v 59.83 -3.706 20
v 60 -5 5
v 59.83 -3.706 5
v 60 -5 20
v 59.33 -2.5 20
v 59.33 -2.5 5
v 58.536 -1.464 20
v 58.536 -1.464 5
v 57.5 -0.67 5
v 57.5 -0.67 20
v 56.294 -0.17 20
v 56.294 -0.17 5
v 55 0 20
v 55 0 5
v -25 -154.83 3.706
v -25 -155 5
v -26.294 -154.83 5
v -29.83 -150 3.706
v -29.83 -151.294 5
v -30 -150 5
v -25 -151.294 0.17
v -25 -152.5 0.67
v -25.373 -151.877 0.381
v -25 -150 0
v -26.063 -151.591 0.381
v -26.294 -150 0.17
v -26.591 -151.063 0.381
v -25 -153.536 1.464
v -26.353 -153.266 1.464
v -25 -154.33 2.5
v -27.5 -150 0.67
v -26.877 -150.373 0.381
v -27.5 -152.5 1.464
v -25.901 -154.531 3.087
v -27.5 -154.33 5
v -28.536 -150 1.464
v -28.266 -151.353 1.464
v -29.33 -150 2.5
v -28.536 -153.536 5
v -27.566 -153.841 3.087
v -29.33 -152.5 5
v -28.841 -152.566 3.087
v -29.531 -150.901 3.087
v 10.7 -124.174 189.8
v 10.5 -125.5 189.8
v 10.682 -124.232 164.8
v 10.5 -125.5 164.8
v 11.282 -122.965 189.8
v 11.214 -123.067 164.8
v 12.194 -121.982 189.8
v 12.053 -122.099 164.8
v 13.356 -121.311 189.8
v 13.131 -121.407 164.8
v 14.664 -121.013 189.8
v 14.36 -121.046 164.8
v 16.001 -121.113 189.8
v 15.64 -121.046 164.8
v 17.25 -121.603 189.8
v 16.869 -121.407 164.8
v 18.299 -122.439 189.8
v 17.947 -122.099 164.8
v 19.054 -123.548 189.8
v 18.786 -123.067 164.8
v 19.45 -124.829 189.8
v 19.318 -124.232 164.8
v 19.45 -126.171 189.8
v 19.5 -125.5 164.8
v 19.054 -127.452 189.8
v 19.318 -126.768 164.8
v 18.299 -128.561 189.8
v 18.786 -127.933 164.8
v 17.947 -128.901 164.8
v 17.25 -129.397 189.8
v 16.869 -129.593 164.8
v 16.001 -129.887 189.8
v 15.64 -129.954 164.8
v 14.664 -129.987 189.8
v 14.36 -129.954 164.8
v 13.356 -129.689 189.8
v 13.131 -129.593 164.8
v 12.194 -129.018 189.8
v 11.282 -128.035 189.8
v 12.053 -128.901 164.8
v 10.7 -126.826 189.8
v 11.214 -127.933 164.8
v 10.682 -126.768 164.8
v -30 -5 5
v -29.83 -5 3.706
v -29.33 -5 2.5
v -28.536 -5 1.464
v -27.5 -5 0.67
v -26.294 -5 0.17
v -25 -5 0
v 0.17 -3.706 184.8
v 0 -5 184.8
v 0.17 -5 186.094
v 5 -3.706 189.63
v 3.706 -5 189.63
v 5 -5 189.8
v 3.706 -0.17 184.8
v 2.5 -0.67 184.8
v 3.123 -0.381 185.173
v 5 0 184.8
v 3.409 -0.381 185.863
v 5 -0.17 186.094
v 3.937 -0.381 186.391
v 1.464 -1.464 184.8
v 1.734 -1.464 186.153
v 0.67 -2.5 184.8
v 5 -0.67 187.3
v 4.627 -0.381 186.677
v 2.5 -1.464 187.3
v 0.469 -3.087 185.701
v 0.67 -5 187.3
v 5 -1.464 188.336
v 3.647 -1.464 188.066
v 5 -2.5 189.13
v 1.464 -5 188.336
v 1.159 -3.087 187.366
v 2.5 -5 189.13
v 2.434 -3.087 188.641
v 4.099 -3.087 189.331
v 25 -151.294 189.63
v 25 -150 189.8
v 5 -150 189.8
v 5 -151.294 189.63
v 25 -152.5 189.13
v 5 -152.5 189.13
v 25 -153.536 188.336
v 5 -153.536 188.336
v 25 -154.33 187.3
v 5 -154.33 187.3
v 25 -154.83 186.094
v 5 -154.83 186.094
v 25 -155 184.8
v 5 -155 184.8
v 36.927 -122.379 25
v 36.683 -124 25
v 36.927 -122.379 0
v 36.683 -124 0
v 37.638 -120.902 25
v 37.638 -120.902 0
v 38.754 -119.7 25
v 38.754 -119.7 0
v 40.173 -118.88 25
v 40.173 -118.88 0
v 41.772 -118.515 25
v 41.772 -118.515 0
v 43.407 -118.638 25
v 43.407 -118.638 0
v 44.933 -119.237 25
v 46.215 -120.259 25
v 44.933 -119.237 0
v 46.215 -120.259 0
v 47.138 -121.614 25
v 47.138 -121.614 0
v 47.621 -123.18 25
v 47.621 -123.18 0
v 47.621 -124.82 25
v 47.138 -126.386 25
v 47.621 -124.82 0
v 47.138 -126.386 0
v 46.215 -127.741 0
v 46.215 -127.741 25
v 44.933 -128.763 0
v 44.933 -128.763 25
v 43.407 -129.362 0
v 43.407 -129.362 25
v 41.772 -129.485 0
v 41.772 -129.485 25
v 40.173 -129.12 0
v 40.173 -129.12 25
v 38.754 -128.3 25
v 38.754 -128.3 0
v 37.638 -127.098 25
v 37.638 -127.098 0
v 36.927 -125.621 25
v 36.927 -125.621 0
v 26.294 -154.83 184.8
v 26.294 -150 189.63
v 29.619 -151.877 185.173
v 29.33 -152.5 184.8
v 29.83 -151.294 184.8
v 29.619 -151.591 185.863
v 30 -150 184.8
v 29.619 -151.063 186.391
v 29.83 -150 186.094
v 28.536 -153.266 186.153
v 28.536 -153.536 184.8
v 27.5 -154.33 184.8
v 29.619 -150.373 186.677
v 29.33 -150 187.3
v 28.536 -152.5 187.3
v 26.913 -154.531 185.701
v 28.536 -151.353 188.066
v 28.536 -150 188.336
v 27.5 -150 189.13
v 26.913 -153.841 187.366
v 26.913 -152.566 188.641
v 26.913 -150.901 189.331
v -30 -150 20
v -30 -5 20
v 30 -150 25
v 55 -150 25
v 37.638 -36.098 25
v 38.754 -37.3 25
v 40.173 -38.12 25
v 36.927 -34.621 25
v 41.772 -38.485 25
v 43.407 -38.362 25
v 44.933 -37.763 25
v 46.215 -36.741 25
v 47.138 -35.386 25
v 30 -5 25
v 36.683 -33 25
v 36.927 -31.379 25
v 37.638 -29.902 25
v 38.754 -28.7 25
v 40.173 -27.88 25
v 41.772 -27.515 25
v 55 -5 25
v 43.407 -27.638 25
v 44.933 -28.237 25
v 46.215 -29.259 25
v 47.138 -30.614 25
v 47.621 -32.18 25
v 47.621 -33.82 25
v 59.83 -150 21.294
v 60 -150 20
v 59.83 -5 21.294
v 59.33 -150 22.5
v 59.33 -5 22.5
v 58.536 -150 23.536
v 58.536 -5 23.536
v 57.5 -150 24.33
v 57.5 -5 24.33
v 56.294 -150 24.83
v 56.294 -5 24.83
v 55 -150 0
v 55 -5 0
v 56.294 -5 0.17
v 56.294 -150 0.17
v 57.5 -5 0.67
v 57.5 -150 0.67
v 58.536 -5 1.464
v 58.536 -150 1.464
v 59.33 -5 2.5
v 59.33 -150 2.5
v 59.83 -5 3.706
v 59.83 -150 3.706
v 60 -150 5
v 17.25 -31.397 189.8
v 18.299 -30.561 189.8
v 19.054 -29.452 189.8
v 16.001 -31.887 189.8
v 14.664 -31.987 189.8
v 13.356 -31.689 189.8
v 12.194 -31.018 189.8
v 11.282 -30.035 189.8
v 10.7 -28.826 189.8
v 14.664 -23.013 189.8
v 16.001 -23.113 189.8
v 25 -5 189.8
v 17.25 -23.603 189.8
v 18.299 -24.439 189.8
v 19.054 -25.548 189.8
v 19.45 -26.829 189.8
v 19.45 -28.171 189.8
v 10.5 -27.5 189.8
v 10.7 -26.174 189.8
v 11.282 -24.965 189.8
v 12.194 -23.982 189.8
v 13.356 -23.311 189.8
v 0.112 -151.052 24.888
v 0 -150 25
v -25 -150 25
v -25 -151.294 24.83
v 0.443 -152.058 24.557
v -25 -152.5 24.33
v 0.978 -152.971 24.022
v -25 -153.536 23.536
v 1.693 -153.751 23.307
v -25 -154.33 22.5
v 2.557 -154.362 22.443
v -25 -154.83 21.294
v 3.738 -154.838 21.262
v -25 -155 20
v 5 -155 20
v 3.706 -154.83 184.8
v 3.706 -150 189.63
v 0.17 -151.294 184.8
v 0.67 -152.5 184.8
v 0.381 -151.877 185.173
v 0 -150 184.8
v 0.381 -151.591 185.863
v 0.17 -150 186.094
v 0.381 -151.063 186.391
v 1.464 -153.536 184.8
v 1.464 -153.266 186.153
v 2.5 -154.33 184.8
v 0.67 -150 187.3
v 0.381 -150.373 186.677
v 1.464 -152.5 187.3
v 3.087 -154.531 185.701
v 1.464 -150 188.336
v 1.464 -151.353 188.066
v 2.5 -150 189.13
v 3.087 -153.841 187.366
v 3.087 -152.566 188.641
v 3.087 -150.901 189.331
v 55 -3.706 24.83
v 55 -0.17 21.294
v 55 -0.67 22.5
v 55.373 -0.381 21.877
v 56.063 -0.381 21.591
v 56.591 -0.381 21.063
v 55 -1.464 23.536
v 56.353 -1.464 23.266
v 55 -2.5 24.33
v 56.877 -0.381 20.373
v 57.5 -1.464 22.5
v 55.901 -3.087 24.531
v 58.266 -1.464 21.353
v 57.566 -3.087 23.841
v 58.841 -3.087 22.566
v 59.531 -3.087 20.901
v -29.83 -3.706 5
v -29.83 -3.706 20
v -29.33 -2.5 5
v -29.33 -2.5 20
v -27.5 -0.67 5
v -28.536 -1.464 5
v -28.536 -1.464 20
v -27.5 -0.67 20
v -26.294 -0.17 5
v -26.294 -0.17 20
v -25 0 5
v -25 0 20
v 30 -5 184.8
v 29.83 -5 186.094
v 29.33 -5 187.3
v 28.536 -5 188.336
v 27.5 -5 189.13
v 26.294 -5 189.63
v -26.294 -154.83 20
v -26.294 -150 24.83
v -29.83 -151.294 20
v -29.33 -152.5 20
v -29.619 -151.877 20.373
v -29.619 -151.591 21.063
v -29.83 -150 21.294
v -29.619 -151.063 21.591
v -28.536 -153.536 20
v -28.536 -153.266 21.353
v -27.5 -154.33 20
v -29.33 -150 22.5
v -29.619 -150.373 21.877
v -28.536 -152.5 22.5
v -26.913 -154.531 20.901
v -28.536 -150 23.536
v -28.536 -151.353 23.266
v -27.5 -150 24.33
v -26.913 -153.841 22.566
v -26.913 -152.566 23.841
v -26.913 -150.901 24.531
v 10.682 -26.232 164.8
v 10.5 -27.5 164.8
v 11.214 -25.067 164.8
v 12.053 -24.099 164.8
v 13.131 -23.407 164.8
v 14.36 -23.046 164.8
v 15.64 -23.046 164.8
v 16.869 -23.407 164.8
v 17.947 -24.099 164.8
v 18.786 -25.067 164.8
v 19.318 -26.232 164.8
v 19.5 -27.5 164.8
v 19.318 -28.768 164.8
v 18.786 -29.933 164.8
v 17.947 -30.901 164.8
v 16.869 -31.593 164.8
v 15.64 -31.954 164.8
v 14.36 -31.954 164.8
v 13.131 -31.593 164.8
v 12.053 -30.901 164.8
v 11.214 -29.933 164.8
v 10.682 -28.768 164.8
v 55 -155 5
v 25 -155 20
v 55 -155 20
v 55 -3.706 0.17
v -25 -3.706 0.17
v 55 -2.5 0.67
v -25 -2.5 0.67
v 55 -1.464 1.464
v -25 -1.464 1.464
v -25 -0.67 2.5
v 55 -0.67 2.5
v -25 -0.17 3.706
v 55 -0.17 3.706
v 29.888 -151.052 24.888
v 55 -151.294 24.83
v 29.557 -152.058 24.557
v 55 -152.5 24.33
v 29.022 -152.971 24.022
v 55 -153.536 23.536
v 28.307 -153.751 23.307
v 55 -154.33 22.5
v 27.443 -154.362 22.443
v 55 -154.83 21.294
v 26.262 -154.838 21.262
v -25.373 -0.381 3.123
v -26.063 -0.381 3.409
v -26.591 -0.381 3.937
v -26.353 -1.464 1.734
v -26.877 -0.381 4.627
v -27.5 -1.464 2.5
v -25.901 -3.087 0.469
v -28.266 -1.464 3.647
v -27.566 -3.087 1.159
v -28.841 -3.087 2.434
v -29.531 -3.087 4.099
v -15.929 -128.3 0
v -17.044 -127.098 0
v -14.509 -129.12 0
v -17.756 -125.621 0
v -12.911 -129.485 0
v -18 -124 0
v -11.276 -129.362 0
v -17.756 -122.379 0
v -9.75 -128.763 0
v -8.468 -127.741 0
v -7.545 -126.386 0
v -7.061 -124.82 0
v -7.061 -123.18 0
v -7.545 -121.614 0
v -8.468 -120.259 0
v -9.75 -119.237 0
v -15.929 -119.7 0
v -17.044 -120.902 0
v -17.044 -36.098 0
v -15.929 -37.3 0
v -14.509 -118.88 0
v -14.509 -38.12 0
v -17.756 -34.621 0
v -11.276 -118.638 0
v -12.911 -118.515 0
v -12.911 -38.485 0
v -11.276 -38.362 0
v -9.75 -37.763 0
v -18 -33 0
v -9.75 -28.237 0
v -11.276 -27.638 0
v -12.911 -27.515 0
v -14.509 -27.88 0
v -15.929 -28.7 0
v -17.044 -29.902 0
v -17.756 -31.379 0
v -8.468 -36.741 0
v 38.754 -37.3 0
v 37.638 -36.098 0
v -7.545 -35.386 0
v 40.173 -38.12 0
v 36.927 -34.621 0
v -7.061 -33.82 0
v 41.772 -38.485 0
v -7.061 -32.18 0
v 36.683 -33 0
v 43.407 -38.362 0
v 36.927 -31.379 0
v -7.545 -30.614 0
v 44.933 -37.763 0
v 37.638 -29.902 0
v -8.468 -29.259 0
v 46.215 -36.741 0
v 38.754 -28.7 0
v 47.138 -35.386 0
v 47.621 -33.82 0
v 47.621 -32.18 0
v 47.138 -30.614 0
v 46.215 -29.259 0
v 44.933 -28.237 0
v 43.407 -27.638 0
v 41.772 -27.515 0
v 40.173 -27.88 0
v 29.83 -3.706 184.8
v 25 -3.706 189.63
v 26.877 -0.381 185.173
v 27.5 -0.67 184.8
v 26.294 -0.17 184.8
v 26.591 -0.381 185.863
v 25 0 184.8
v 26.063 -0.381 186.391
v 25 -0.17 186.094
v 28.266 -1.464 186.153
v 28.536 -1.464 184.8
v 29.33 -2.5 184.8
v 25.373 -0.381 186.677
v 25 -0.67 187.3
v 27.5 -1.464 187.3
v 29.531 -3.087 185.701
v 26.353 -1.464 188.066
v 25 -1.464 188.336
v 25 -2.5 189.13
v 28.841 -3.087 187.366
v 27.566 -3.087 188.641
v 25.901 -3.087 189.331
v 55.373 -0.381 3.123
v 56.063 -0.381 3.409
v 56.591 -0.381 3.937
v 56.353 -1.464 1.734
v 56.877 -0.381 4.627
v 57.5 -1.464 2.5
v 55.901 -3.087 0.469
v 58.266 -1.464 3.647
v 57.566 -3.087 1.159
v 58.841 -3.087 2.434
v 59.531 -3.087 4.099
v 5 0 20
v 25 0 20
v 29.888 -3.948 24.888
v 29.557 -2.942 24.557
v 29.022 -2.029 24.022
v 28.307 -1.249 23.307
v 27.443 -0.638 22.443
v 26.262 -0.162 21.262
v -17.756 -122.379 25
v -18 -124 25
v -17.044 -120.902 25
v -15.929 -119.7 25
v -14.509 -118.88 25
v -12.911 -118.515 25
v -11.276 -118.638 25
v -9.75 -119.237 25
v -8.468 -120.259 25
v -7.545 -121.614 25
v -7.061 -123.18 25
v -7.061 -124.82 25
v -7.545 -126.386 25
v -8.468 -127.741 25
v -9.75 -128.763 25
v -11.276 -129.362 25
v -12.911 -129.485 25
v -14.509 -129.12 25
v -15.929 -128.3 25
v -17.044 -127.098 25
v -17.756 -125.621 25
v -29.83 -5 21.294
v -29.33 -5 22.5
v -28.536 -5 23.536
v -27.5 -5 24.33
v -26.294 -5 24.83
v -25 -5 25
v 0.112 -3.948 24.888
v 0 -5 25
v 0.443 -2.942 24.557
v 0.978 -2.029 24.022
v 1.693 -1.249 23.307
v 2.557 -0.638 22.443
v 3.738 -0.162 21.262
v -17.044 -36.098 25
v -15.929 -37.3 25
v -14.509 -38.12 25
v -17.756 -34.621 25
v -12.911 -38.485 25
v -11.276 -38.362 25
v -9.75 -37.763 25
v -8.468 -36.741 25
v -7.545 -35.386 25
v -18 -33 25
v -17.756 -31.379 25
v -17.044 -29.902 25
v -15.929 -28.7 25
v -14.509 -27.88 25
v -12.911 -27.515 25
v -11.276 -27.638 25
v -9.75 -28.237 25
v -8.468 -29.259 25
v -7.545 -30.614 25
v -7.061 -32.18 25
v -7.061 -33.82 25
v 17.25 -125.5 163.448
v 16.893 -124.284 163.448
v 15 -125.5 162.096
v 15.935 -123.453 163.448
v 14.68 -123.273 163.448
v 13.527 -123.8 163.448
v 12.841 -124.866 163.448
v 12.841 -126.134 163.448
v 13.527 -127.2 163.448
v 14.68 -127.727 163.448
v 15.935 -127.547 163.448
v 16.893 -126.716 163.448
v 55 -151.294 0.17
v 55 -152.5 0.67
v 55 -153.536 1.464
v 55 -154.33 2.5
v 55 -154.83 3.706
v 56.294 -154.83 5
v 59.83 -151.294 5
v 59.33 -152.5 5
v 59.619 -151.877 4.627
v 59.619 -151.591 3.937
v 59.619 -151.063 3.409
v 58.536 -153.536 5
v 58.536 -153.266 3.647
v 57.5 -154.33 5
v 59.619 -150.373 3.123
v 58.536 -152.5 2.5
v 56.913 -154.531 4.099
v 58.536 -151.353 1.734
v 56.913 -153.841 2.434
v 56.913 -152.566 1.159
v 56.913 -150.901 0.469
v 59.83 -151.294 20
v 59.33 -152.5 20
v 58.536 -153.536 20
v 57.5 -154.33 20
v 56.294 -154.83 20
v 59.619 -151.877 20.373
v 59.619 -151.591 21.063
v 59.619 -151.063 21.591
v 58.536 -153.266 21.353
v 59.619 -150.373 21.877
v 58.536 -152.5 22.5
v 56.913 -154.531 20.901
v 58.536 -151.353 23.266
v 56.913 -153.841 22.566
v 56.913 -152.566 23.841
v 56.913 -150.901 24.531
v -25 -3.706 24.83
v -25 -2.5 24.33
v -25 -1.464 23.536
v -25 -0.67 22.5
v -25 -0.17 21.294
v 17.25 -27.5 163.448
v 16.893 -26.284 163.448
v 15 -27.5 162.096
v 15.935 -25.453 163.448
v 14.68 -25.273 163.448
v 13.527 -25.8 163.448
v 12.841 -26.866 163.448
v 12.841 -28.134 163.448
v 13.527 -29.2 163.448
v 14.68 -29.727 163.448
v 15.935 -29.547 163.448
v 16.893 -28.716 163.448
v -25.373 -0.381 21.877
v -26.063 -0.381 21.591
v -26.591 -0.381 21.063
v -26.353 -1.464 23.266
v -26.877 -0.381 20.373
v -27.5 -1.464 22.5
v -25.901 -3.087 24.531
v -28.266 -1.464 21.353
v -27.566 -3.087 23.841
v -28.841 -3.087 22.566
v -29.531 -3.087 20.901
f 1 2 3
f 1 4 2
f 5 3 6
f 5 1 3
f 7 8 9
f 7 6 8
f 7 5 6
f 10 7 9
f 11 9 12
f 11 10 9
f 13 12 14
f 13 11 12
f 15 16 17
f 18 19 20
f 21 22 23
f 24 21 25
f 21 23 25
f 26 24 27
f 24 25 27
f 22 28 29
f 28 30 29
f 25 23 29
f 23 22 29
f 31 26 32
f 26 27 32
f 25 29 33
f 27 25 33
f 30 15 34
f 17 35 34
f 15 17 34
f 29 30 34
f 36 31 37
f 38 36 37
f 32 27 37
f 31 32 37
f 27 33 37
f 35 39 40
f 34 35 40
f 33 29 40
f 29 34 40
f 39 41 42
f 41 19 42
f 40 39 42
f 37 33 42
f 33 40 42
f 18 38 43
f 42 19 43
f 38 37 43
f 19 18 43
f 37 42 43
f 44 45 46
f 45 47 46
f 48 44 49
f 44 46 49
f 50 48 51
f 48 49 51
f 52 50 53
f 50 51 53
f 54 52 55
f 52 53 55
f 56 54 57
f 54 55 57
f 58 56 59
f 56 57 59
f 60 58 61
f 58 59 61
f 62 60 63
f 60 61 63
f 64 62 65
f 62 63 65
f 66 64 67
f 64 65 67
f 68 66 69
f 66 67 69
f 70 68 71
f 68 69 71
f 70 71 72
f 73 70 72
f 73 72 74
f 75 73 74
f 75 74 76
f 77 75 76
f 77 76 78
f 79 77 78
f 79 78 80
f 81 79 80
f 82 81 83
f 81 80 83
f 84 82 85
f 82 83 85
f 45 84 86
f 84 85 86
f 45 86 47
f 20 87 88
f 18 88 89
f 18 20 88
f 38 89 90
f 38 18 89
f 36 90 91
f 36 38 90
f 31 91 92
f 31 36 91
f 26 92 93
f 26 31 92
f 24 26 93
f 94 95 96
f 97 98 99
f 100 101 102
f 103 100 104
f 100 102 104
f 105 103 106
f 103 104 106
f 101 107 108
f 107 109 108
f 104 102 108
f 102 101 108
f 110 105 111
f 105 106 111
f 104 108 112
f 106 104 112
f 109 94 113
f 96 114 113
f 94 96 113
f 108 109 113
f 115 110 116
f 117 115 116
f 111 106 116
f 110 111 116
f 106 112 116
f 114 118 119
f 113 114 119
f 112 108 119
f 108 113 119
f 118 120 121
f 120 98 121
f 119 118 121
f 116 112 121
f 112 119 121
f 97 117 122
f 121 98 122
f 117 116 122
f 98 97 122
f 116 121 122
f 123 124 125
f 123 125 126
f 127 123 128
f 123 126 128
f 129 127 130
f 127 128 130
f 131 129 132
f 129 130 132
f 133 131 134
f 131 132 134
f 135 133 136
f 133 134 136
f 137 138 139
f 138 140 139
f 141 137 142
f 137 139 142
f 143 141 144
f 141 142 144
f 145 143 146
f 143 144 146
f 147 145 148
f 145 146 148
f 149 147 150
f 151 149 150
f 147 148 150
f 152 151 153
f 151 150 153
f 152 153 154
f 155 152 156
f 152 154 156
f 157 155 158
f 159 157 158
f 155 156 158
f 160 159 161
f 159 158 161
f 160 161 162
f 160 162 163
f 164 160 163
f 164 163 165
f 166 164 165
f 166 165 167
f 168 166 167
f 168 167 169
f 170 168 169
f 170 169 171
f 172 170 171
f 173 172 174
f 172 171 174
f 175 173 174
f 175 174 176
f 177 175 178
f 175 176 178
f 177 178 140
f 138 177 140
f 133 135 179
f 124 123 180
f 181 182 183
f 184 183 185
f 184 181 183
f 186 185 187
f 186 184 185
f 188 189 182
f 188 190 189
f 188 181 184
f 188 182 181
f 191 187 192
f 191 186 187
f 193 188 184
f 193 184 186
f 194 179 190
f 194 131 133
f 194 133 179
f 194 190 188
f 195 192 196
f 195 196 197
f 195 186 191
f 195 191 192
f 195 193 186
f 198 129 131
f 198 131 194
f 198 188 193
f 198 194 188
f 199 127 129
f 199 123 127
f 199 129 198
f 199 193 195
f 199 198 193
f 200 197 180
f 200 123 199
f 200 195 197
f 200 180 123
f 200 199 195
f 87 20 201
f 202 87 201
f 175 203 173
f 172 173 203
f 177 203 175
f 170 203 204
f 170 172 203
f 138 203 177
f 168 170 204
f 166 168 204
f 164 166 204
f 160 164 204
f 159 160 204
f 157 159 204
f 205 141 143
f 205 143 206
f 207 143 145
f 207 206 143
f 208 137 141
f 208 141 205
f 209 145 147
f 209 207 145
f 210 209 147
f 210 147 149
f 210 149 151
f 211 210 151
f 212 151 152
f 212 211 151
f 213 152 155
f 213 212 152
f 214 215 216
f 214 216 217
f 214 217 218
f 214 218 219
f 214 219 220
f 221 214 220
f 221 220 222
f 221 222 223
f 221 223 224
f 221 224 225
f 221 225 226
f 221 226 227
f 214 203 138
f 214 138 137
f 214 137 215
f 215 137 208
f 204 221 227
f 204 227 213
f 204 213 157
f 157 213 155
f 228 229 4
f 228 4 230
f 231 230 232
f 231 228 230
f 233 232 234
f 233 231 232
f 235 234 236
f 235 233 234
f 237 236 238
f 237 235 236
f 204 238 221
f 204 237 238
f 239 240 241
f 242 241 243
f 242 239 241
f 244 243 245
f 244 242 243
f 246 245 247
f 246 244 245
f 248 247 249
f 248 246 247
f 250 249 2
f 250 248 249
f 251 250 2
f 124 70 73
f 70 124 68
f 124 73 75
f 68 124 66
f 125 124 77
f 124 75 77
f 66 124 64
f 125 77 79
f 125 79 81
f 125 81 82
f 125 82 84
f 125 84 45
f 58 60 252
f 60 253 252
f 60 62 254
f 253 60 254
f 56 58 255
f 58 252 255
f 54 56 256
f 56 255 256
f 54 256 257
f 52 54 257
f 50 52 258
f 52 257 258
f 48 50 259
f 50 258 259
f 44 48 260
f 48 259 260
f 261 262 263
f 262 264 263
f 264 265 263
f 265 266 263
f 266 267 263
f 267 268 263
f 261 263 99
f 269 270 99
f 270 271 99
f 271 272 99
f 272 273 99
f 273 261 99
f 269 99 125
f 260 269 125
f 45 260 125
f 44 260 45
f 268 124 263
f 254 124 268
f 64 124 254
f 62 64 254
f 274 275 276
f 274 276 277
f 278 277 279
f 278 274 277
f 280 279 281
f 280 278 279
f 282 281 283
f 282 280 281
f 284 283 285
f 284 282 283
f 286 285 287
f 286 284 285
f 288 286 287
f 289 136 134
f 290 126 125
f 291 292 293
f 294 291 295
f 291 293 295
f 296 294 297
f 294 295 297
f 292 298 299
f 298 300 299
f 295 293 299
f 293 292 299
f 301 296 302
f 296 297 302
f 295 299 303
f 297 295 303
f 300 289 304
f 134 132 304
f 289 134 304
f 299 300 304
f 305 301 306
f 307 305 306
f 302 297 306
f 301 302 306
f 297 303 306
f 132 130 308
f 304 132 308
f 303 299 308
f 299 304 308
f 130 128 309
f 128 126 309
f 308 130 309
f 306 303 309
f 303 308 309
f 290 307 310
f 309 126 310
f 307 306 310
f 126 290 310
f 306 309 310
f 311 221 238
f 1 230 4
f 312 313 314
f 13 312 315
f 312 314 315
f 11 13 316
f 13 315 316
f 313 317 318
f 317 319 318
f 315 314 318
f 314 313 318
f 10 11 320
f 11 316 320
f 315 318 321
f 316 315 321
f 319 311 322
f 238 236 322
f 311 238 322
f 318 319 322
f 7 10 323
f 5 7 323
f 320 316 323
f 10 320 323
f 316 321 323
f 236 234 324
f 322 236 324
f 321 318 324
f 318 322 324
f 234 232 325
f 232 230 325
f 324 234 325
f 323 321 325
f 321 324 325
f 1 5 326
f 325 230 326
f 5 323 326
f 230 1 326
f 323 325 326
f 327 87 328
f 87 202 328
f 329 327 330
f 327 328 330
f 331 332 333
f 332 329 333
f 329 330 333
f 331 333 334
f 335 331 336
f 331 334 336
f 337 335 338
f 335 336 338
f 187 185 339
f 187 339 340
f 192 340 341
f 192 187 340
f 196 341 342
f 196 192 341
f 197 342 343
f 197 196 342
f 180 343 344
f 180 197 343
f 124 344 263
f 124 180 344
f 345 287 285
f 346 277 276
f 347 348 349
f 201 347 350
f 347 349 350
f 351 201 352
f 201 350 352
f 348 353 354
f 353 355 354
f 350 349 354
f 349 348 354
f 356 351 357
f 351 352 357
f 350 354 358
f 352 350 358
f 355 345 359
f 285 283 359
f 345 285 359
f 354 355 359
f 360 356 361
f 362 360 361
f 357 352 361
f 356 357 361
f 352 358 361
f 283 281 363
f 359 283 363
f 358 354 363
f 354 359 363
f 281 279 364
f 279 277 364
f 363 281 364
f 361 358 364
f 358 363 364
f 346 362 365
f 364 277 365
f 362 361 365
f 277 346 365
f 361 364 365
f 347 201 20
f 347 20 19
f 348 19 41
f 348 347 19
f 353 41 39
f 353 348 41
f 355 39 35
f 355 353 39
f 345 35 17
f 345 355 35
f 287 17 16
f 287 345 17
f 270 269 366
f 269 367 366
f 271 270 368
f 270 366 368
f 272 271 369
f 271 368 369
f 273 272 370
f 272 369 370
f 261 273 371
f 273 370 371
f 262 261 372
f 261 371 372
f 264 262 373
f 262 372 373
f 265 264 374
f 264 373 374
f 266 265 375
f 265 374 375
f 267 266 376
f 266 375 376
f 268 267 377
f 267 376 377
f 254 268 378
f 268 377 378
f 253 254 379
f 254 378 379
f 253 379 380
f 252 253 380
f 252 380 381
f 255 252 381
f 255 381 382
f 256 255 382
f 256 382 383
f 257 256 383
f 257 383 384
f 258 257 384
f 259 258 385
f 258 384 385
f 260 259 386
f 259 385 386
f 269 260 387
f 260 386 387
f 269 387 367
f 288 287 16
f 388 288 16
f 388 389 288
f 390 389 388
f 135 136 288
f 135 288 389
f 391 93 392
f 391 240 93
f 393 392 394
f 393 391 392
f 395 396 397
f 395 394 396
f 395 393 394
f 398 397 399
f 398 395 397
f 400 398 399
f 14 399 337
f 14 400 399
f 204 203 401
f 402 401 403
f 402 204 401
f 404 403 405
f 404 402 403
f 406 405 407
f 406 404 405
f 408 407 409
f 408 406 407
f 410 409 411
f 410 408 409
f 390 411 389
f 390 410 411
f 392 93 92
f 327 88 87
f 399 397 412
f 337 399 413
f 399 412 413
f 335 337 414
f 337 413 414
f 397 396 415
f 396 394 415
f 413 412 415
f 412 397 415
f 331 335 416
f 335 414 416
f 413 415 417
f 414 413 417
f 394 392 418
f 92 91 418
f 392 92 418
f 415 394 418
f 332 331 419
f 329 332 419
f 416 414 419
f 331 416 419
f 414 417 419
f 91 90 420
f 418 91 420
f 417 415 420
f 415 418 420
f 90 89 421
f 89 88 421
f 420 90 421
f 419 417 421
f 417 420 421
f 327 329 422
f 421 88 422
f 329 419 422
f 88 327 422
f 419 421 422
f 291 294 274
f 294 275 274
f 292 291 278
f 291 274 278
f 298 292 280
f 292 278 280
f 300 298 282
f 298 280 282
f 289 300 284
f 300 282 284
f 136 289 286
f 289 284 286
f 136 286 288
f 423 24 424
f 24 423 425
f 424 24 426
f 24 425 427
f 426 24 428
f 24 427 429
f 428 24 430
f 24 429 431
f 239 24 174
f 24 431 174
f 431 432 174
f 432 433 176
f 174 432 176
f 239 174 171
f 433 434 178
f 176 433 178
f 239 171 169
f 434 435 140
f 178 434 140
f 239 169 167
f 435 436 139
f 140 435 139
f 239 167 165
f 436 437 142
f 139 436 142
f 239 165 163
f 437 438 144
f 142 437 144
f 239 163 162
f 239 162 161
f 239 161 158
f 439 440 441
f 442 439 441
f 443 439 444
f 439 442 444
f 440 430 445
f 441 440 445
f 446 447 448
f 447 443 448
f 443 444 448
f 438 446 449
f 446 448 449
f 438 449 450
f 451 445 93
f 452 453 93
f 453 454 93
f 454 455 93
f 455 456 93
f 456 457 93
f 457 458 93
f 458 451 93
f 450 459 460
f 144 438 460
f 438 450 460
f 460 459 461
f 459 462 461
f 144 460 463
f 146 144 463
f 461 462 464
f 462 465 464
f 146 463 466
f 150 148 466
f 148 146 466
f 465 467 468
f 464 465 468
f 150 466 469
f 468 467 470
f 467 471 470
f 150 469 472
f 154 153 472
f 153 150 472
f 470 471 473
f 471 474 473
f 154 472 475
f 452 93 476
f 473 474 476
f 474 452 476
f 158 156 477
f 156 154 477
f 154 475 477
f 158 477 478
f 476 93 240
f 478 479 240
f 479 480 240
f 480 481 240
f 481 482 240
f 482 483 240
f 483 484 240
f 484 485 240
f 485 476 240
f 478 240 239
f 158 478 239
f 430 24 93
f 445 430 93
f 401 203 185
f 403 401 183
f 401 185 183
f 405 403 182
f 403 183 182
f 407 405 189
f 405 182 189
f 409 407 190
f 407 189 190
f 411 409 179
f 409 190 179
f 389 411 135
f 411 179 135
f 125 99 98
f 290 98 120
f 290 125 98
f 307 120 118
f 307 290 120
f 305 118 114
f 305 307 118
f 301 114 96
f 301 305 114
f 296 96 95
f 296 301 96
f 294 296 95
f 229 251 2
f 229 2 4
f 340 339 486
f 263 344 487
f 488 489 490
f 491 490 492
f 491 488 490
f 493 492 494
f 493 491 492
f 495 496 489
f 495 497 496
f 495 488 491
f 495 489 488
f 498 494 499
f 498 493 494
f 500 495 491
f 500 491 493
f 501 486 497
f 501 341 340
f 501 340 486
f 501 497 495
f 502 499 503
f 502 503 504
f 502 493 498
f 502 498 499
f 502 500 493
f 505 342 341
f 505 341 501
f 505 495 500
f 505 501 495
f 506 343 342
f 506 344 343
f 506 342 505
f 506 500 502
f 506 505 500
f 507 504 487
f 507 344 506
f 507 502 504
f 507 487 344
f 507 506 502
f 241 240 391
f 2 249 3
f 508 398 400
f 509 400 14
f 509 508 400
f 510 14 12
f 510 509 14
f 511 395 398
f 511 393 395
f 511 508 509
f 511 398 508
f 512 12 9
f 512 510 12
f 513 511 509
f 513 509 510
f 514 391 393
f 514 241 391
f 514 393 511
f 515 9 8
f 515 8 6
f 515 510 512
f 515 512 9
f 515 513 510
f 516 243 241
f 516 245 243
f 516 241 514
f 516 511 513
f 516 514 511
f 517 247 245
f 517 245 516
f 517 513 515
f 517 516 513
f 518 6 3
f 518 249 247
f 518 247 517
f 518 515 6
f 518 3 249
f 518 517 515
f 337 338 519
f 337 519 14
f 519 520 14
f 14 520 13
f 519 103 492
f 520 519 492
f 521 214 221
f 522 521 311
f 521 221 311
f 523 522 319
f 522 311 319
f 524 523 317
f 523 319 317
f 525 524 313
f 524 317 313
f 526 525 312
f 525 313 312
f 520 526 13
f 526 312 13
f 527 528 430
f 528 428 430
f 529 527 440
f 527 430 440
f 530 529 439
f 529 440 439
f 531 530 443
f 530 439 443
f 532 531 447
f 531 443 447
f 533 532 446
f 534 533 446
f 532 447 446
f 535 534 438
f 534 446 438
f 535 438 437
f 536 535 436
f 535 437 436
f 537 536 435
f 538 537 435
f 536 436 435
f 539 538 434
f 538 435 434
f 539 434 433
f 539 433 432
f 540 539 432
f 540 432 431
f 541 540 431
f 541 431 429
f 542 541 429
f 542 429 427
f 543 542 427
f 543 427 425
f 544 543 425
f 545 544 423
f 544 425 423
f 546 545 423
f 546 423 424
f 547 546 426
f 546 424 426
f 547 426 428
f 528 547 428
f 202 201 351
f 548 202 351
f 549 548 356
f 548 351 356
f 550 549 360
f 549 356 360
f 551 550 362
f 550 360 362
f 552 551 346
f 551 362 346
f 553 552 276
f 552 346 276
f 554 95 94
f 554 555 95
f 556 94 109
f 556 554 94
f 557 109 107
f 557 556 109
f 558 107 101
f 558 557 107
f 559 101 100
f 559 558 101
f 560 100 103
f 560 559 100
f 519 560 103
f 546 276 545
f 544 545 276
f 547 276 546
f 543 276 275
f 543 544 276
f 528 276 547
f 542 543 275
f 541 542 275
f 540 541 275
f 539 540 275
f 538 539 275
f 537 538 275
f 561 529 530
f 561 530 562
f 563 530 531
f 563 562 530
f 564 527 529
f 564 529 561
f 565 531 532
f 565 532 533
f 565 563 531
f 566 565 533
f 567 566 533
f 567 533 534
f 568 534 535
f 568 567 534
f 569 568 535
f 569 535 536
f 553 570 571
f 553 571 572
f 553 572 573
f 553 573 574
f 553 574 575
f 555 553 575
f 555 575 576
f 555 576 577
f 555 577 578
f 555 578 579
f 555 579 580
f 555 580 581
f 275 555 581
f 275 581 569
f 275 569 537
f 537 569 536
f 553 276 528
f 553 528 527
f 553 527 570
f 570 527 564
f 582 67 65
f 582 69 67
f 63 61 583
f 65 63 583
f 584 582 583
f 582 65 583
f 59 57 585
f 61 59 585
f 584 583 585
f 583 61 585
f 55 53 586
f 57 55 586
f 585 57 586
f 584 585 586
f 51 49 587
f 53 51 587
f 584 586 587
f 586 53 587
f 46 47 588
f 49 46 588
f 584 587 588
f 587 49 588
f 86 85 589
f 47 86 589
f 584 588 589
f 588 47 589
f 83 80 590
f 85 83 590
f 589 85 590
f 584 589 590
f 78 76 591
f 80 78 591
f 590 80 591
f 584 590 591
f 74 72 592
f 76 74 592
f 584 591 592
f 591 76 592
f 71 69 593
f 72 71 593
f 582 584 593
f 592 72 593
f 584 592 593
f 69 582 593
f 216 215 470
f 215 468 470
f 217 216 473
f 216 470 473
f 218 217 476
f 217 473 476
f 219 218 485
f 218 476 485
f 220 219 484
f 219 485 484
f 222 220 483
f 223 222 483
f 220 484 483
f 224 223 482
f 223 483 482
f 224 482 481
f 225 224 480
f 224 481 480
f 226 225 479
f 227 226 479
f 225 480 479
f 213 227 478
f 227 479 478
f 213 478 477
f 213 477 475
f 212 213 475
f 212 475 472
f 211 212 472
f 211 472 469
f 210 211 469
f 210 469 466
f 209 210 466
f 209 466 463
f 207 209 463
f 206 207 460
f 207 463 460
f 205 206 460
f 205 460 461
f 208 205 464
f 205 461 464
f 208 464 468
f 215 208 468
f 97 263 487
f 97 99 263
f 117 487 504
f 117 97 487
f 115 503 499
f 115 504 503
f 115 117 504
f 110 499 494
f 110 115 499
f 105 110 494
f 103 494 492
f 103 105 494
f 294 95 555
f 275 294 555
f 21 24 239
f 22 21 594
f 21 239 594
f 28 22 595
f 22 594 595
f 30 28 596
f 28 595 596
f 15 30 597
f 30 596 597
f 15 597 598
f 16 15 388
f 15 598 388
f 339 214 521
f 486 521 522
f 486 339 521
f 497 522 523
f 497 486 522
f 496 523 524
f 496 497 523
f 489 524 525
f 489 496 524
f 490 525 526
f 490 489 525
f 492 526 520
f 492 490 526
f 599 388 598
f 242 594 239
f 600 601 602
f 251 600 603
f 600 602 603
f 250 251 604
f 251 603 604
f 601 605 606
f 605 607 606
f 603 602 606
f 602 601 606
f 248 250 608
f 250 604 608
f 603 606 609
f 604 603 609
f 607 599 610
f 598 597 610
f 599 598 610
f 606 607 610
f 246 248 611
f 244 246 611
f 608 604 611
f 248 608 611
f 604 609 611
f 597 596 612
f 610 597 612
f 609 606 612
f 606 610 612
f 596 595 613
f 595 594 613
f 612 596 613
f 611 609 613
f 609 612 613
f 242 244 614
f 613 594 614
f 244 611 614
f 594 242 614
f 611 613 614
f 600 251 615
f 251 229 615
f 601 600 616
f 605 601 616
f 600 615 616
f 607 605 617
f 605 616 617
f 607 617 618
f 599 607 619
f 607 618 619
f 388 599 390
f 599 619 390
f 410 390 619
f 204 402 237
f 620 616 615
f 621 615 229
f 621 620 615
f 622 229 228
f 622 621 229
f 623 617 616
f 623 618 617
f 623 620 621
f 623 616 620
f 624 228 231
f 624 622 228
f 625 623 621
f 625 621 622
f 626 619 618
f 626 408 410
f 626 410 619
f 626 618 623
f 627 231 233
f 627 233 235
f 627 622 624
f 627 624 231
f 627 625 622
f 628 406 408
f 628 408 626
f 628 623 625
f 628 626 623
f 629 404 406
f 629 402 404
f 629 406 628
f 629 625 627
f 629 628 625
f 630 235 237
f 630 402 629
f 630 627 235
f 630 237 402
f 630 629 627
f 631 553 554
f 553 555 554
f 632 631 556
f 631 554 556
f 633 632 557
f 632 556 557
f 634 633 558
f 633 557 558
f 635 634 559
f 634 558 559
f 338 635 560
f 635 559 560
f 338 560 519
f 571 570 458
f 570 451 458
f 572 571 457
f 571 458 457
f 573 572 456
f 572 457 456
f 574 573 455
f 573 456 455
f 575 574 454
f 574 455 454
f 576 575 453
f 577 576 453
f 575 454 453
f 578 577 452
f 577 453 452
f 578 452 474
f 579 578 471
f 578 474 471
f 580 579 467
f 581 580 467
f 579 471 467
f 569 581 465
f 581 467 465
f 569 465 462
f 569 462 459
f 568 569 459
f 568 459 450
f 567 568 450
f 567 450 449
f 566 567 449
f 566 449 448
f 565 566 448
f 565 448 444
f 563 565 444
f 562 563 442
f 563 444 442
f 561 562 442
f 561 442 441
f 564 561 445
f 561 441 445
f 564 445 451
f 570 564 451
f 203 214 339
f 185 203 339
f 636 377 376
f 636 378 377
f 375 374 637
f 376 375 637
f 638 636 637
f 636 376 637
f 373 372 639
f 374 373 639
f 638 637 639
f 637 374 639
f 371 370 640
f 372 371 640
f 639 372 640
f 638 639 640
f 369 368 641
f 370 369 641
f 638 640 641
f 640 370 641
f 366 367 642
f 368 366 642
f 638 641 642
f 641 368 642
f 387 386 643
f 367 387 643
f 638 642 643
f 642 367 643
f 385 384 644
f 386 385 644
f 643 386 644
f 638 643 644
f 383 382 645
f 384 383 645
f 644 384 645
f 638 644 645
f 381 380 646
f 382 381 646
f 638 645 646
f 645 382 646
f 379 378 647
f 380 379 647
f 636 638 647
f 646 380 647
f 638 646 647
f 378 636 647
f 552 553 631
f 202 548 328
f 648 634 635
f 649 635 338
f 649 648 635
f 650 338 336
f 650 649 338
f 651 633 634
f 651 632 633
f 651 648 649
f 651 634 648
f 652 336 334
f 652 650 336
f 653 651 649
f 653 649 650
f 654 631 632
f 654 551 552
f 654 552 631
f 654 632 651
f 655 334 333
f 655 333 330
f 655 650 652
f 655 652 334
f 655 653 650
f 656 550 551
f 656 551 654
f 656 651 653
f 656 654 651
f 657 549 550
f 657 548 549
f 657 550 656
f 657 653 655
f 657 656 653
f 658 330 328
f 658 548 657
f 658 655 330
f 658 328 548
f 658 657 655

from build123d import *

# Parameters (mm, degrees)
F0_W     = 30
F0_H     = 25
F1_DEPTH = 155
F2_R     = 5
F4_D     = 9
F4_DEPTH = 25
F4_TIP   = 2.7038727856
F6_D     = 11
F6_DEPTH = 25
F6_TIP   = 3.3047334047


with BuildPart() as f1:
    # F0 (on Front) → F1 (new body)
    with BuildSketch(Plane.XZ):
        with Locations((-15, 12.5)):
            Rectangle(F0_W, F0_H)
        Polygon((0, 25), (0, 0), (30, 0), (30, 25), (30, 189.8), (0, 189.8), align=None)
        with Locations((45, 12.5)):
            Rectangle(F0_W, F0_H)
    extrude(amount=F1_DEPTH)

    # F2
    f2_edges = [f1.edges().sort_by_distance(p)[0] for p in [
        (15, -155, 189.8),
        (0, -155, 107.4),
        (30, -155, 107.4),
        (45, -155, 25),
        (-15, -155, 25),
        (-30, -155, 12.5),
        (15, -155, 0),
        (60, -155, 12.5),
        (60, -77.5, 25),
        (60, -77.5, 0),
        (-30, -77.5, 25),
        (-30, -77.5, 0),
        (0, -77.5, 189.8),
        (30, -77.5, 189.8),
        (0, 0, 107.4),
        (30, 0, 107.4),
        (45, 0, 25),
        (15, 0, 0),
        (-15, 0, 25),
        (-30, 0, 12.5),
        (60, 0, 12.5),
        (15, 0, 189.8),
    ]]
    fillet(f2_edges, radius=F2_R)

    # F4
    with Locations(Plane.XY.offset(189.8)):
        with Locations((15, -27.5), (15, -125.5)):
            Hole(F4_D / 2, depth=F4_DEPTH)
            with Locations((0, 0, -(F4_DEPTH + F4_TIP / 2))):  # 118° drill point
                Cone(0, F4_D / 2, F4_TIP, mode=Mode.SUBTRACT)

    # F6
    with Locations(Plane.XY.offset(25)):
        with Locations((-12.5, -33), (-12.5, -124), (42.1827733517, -33), (42.1827733517, -124)):
            Hole(F6_D / 2, depth=F6_DEPTH)
            with Locations((0, 0, -(F6_DEPTH + F6_TIP / 2))):  # 118° drill point
                Cone(0, F6_D / 2, F6_TIP, mode=Mode.SUBTRACT)


solid = f1.part
